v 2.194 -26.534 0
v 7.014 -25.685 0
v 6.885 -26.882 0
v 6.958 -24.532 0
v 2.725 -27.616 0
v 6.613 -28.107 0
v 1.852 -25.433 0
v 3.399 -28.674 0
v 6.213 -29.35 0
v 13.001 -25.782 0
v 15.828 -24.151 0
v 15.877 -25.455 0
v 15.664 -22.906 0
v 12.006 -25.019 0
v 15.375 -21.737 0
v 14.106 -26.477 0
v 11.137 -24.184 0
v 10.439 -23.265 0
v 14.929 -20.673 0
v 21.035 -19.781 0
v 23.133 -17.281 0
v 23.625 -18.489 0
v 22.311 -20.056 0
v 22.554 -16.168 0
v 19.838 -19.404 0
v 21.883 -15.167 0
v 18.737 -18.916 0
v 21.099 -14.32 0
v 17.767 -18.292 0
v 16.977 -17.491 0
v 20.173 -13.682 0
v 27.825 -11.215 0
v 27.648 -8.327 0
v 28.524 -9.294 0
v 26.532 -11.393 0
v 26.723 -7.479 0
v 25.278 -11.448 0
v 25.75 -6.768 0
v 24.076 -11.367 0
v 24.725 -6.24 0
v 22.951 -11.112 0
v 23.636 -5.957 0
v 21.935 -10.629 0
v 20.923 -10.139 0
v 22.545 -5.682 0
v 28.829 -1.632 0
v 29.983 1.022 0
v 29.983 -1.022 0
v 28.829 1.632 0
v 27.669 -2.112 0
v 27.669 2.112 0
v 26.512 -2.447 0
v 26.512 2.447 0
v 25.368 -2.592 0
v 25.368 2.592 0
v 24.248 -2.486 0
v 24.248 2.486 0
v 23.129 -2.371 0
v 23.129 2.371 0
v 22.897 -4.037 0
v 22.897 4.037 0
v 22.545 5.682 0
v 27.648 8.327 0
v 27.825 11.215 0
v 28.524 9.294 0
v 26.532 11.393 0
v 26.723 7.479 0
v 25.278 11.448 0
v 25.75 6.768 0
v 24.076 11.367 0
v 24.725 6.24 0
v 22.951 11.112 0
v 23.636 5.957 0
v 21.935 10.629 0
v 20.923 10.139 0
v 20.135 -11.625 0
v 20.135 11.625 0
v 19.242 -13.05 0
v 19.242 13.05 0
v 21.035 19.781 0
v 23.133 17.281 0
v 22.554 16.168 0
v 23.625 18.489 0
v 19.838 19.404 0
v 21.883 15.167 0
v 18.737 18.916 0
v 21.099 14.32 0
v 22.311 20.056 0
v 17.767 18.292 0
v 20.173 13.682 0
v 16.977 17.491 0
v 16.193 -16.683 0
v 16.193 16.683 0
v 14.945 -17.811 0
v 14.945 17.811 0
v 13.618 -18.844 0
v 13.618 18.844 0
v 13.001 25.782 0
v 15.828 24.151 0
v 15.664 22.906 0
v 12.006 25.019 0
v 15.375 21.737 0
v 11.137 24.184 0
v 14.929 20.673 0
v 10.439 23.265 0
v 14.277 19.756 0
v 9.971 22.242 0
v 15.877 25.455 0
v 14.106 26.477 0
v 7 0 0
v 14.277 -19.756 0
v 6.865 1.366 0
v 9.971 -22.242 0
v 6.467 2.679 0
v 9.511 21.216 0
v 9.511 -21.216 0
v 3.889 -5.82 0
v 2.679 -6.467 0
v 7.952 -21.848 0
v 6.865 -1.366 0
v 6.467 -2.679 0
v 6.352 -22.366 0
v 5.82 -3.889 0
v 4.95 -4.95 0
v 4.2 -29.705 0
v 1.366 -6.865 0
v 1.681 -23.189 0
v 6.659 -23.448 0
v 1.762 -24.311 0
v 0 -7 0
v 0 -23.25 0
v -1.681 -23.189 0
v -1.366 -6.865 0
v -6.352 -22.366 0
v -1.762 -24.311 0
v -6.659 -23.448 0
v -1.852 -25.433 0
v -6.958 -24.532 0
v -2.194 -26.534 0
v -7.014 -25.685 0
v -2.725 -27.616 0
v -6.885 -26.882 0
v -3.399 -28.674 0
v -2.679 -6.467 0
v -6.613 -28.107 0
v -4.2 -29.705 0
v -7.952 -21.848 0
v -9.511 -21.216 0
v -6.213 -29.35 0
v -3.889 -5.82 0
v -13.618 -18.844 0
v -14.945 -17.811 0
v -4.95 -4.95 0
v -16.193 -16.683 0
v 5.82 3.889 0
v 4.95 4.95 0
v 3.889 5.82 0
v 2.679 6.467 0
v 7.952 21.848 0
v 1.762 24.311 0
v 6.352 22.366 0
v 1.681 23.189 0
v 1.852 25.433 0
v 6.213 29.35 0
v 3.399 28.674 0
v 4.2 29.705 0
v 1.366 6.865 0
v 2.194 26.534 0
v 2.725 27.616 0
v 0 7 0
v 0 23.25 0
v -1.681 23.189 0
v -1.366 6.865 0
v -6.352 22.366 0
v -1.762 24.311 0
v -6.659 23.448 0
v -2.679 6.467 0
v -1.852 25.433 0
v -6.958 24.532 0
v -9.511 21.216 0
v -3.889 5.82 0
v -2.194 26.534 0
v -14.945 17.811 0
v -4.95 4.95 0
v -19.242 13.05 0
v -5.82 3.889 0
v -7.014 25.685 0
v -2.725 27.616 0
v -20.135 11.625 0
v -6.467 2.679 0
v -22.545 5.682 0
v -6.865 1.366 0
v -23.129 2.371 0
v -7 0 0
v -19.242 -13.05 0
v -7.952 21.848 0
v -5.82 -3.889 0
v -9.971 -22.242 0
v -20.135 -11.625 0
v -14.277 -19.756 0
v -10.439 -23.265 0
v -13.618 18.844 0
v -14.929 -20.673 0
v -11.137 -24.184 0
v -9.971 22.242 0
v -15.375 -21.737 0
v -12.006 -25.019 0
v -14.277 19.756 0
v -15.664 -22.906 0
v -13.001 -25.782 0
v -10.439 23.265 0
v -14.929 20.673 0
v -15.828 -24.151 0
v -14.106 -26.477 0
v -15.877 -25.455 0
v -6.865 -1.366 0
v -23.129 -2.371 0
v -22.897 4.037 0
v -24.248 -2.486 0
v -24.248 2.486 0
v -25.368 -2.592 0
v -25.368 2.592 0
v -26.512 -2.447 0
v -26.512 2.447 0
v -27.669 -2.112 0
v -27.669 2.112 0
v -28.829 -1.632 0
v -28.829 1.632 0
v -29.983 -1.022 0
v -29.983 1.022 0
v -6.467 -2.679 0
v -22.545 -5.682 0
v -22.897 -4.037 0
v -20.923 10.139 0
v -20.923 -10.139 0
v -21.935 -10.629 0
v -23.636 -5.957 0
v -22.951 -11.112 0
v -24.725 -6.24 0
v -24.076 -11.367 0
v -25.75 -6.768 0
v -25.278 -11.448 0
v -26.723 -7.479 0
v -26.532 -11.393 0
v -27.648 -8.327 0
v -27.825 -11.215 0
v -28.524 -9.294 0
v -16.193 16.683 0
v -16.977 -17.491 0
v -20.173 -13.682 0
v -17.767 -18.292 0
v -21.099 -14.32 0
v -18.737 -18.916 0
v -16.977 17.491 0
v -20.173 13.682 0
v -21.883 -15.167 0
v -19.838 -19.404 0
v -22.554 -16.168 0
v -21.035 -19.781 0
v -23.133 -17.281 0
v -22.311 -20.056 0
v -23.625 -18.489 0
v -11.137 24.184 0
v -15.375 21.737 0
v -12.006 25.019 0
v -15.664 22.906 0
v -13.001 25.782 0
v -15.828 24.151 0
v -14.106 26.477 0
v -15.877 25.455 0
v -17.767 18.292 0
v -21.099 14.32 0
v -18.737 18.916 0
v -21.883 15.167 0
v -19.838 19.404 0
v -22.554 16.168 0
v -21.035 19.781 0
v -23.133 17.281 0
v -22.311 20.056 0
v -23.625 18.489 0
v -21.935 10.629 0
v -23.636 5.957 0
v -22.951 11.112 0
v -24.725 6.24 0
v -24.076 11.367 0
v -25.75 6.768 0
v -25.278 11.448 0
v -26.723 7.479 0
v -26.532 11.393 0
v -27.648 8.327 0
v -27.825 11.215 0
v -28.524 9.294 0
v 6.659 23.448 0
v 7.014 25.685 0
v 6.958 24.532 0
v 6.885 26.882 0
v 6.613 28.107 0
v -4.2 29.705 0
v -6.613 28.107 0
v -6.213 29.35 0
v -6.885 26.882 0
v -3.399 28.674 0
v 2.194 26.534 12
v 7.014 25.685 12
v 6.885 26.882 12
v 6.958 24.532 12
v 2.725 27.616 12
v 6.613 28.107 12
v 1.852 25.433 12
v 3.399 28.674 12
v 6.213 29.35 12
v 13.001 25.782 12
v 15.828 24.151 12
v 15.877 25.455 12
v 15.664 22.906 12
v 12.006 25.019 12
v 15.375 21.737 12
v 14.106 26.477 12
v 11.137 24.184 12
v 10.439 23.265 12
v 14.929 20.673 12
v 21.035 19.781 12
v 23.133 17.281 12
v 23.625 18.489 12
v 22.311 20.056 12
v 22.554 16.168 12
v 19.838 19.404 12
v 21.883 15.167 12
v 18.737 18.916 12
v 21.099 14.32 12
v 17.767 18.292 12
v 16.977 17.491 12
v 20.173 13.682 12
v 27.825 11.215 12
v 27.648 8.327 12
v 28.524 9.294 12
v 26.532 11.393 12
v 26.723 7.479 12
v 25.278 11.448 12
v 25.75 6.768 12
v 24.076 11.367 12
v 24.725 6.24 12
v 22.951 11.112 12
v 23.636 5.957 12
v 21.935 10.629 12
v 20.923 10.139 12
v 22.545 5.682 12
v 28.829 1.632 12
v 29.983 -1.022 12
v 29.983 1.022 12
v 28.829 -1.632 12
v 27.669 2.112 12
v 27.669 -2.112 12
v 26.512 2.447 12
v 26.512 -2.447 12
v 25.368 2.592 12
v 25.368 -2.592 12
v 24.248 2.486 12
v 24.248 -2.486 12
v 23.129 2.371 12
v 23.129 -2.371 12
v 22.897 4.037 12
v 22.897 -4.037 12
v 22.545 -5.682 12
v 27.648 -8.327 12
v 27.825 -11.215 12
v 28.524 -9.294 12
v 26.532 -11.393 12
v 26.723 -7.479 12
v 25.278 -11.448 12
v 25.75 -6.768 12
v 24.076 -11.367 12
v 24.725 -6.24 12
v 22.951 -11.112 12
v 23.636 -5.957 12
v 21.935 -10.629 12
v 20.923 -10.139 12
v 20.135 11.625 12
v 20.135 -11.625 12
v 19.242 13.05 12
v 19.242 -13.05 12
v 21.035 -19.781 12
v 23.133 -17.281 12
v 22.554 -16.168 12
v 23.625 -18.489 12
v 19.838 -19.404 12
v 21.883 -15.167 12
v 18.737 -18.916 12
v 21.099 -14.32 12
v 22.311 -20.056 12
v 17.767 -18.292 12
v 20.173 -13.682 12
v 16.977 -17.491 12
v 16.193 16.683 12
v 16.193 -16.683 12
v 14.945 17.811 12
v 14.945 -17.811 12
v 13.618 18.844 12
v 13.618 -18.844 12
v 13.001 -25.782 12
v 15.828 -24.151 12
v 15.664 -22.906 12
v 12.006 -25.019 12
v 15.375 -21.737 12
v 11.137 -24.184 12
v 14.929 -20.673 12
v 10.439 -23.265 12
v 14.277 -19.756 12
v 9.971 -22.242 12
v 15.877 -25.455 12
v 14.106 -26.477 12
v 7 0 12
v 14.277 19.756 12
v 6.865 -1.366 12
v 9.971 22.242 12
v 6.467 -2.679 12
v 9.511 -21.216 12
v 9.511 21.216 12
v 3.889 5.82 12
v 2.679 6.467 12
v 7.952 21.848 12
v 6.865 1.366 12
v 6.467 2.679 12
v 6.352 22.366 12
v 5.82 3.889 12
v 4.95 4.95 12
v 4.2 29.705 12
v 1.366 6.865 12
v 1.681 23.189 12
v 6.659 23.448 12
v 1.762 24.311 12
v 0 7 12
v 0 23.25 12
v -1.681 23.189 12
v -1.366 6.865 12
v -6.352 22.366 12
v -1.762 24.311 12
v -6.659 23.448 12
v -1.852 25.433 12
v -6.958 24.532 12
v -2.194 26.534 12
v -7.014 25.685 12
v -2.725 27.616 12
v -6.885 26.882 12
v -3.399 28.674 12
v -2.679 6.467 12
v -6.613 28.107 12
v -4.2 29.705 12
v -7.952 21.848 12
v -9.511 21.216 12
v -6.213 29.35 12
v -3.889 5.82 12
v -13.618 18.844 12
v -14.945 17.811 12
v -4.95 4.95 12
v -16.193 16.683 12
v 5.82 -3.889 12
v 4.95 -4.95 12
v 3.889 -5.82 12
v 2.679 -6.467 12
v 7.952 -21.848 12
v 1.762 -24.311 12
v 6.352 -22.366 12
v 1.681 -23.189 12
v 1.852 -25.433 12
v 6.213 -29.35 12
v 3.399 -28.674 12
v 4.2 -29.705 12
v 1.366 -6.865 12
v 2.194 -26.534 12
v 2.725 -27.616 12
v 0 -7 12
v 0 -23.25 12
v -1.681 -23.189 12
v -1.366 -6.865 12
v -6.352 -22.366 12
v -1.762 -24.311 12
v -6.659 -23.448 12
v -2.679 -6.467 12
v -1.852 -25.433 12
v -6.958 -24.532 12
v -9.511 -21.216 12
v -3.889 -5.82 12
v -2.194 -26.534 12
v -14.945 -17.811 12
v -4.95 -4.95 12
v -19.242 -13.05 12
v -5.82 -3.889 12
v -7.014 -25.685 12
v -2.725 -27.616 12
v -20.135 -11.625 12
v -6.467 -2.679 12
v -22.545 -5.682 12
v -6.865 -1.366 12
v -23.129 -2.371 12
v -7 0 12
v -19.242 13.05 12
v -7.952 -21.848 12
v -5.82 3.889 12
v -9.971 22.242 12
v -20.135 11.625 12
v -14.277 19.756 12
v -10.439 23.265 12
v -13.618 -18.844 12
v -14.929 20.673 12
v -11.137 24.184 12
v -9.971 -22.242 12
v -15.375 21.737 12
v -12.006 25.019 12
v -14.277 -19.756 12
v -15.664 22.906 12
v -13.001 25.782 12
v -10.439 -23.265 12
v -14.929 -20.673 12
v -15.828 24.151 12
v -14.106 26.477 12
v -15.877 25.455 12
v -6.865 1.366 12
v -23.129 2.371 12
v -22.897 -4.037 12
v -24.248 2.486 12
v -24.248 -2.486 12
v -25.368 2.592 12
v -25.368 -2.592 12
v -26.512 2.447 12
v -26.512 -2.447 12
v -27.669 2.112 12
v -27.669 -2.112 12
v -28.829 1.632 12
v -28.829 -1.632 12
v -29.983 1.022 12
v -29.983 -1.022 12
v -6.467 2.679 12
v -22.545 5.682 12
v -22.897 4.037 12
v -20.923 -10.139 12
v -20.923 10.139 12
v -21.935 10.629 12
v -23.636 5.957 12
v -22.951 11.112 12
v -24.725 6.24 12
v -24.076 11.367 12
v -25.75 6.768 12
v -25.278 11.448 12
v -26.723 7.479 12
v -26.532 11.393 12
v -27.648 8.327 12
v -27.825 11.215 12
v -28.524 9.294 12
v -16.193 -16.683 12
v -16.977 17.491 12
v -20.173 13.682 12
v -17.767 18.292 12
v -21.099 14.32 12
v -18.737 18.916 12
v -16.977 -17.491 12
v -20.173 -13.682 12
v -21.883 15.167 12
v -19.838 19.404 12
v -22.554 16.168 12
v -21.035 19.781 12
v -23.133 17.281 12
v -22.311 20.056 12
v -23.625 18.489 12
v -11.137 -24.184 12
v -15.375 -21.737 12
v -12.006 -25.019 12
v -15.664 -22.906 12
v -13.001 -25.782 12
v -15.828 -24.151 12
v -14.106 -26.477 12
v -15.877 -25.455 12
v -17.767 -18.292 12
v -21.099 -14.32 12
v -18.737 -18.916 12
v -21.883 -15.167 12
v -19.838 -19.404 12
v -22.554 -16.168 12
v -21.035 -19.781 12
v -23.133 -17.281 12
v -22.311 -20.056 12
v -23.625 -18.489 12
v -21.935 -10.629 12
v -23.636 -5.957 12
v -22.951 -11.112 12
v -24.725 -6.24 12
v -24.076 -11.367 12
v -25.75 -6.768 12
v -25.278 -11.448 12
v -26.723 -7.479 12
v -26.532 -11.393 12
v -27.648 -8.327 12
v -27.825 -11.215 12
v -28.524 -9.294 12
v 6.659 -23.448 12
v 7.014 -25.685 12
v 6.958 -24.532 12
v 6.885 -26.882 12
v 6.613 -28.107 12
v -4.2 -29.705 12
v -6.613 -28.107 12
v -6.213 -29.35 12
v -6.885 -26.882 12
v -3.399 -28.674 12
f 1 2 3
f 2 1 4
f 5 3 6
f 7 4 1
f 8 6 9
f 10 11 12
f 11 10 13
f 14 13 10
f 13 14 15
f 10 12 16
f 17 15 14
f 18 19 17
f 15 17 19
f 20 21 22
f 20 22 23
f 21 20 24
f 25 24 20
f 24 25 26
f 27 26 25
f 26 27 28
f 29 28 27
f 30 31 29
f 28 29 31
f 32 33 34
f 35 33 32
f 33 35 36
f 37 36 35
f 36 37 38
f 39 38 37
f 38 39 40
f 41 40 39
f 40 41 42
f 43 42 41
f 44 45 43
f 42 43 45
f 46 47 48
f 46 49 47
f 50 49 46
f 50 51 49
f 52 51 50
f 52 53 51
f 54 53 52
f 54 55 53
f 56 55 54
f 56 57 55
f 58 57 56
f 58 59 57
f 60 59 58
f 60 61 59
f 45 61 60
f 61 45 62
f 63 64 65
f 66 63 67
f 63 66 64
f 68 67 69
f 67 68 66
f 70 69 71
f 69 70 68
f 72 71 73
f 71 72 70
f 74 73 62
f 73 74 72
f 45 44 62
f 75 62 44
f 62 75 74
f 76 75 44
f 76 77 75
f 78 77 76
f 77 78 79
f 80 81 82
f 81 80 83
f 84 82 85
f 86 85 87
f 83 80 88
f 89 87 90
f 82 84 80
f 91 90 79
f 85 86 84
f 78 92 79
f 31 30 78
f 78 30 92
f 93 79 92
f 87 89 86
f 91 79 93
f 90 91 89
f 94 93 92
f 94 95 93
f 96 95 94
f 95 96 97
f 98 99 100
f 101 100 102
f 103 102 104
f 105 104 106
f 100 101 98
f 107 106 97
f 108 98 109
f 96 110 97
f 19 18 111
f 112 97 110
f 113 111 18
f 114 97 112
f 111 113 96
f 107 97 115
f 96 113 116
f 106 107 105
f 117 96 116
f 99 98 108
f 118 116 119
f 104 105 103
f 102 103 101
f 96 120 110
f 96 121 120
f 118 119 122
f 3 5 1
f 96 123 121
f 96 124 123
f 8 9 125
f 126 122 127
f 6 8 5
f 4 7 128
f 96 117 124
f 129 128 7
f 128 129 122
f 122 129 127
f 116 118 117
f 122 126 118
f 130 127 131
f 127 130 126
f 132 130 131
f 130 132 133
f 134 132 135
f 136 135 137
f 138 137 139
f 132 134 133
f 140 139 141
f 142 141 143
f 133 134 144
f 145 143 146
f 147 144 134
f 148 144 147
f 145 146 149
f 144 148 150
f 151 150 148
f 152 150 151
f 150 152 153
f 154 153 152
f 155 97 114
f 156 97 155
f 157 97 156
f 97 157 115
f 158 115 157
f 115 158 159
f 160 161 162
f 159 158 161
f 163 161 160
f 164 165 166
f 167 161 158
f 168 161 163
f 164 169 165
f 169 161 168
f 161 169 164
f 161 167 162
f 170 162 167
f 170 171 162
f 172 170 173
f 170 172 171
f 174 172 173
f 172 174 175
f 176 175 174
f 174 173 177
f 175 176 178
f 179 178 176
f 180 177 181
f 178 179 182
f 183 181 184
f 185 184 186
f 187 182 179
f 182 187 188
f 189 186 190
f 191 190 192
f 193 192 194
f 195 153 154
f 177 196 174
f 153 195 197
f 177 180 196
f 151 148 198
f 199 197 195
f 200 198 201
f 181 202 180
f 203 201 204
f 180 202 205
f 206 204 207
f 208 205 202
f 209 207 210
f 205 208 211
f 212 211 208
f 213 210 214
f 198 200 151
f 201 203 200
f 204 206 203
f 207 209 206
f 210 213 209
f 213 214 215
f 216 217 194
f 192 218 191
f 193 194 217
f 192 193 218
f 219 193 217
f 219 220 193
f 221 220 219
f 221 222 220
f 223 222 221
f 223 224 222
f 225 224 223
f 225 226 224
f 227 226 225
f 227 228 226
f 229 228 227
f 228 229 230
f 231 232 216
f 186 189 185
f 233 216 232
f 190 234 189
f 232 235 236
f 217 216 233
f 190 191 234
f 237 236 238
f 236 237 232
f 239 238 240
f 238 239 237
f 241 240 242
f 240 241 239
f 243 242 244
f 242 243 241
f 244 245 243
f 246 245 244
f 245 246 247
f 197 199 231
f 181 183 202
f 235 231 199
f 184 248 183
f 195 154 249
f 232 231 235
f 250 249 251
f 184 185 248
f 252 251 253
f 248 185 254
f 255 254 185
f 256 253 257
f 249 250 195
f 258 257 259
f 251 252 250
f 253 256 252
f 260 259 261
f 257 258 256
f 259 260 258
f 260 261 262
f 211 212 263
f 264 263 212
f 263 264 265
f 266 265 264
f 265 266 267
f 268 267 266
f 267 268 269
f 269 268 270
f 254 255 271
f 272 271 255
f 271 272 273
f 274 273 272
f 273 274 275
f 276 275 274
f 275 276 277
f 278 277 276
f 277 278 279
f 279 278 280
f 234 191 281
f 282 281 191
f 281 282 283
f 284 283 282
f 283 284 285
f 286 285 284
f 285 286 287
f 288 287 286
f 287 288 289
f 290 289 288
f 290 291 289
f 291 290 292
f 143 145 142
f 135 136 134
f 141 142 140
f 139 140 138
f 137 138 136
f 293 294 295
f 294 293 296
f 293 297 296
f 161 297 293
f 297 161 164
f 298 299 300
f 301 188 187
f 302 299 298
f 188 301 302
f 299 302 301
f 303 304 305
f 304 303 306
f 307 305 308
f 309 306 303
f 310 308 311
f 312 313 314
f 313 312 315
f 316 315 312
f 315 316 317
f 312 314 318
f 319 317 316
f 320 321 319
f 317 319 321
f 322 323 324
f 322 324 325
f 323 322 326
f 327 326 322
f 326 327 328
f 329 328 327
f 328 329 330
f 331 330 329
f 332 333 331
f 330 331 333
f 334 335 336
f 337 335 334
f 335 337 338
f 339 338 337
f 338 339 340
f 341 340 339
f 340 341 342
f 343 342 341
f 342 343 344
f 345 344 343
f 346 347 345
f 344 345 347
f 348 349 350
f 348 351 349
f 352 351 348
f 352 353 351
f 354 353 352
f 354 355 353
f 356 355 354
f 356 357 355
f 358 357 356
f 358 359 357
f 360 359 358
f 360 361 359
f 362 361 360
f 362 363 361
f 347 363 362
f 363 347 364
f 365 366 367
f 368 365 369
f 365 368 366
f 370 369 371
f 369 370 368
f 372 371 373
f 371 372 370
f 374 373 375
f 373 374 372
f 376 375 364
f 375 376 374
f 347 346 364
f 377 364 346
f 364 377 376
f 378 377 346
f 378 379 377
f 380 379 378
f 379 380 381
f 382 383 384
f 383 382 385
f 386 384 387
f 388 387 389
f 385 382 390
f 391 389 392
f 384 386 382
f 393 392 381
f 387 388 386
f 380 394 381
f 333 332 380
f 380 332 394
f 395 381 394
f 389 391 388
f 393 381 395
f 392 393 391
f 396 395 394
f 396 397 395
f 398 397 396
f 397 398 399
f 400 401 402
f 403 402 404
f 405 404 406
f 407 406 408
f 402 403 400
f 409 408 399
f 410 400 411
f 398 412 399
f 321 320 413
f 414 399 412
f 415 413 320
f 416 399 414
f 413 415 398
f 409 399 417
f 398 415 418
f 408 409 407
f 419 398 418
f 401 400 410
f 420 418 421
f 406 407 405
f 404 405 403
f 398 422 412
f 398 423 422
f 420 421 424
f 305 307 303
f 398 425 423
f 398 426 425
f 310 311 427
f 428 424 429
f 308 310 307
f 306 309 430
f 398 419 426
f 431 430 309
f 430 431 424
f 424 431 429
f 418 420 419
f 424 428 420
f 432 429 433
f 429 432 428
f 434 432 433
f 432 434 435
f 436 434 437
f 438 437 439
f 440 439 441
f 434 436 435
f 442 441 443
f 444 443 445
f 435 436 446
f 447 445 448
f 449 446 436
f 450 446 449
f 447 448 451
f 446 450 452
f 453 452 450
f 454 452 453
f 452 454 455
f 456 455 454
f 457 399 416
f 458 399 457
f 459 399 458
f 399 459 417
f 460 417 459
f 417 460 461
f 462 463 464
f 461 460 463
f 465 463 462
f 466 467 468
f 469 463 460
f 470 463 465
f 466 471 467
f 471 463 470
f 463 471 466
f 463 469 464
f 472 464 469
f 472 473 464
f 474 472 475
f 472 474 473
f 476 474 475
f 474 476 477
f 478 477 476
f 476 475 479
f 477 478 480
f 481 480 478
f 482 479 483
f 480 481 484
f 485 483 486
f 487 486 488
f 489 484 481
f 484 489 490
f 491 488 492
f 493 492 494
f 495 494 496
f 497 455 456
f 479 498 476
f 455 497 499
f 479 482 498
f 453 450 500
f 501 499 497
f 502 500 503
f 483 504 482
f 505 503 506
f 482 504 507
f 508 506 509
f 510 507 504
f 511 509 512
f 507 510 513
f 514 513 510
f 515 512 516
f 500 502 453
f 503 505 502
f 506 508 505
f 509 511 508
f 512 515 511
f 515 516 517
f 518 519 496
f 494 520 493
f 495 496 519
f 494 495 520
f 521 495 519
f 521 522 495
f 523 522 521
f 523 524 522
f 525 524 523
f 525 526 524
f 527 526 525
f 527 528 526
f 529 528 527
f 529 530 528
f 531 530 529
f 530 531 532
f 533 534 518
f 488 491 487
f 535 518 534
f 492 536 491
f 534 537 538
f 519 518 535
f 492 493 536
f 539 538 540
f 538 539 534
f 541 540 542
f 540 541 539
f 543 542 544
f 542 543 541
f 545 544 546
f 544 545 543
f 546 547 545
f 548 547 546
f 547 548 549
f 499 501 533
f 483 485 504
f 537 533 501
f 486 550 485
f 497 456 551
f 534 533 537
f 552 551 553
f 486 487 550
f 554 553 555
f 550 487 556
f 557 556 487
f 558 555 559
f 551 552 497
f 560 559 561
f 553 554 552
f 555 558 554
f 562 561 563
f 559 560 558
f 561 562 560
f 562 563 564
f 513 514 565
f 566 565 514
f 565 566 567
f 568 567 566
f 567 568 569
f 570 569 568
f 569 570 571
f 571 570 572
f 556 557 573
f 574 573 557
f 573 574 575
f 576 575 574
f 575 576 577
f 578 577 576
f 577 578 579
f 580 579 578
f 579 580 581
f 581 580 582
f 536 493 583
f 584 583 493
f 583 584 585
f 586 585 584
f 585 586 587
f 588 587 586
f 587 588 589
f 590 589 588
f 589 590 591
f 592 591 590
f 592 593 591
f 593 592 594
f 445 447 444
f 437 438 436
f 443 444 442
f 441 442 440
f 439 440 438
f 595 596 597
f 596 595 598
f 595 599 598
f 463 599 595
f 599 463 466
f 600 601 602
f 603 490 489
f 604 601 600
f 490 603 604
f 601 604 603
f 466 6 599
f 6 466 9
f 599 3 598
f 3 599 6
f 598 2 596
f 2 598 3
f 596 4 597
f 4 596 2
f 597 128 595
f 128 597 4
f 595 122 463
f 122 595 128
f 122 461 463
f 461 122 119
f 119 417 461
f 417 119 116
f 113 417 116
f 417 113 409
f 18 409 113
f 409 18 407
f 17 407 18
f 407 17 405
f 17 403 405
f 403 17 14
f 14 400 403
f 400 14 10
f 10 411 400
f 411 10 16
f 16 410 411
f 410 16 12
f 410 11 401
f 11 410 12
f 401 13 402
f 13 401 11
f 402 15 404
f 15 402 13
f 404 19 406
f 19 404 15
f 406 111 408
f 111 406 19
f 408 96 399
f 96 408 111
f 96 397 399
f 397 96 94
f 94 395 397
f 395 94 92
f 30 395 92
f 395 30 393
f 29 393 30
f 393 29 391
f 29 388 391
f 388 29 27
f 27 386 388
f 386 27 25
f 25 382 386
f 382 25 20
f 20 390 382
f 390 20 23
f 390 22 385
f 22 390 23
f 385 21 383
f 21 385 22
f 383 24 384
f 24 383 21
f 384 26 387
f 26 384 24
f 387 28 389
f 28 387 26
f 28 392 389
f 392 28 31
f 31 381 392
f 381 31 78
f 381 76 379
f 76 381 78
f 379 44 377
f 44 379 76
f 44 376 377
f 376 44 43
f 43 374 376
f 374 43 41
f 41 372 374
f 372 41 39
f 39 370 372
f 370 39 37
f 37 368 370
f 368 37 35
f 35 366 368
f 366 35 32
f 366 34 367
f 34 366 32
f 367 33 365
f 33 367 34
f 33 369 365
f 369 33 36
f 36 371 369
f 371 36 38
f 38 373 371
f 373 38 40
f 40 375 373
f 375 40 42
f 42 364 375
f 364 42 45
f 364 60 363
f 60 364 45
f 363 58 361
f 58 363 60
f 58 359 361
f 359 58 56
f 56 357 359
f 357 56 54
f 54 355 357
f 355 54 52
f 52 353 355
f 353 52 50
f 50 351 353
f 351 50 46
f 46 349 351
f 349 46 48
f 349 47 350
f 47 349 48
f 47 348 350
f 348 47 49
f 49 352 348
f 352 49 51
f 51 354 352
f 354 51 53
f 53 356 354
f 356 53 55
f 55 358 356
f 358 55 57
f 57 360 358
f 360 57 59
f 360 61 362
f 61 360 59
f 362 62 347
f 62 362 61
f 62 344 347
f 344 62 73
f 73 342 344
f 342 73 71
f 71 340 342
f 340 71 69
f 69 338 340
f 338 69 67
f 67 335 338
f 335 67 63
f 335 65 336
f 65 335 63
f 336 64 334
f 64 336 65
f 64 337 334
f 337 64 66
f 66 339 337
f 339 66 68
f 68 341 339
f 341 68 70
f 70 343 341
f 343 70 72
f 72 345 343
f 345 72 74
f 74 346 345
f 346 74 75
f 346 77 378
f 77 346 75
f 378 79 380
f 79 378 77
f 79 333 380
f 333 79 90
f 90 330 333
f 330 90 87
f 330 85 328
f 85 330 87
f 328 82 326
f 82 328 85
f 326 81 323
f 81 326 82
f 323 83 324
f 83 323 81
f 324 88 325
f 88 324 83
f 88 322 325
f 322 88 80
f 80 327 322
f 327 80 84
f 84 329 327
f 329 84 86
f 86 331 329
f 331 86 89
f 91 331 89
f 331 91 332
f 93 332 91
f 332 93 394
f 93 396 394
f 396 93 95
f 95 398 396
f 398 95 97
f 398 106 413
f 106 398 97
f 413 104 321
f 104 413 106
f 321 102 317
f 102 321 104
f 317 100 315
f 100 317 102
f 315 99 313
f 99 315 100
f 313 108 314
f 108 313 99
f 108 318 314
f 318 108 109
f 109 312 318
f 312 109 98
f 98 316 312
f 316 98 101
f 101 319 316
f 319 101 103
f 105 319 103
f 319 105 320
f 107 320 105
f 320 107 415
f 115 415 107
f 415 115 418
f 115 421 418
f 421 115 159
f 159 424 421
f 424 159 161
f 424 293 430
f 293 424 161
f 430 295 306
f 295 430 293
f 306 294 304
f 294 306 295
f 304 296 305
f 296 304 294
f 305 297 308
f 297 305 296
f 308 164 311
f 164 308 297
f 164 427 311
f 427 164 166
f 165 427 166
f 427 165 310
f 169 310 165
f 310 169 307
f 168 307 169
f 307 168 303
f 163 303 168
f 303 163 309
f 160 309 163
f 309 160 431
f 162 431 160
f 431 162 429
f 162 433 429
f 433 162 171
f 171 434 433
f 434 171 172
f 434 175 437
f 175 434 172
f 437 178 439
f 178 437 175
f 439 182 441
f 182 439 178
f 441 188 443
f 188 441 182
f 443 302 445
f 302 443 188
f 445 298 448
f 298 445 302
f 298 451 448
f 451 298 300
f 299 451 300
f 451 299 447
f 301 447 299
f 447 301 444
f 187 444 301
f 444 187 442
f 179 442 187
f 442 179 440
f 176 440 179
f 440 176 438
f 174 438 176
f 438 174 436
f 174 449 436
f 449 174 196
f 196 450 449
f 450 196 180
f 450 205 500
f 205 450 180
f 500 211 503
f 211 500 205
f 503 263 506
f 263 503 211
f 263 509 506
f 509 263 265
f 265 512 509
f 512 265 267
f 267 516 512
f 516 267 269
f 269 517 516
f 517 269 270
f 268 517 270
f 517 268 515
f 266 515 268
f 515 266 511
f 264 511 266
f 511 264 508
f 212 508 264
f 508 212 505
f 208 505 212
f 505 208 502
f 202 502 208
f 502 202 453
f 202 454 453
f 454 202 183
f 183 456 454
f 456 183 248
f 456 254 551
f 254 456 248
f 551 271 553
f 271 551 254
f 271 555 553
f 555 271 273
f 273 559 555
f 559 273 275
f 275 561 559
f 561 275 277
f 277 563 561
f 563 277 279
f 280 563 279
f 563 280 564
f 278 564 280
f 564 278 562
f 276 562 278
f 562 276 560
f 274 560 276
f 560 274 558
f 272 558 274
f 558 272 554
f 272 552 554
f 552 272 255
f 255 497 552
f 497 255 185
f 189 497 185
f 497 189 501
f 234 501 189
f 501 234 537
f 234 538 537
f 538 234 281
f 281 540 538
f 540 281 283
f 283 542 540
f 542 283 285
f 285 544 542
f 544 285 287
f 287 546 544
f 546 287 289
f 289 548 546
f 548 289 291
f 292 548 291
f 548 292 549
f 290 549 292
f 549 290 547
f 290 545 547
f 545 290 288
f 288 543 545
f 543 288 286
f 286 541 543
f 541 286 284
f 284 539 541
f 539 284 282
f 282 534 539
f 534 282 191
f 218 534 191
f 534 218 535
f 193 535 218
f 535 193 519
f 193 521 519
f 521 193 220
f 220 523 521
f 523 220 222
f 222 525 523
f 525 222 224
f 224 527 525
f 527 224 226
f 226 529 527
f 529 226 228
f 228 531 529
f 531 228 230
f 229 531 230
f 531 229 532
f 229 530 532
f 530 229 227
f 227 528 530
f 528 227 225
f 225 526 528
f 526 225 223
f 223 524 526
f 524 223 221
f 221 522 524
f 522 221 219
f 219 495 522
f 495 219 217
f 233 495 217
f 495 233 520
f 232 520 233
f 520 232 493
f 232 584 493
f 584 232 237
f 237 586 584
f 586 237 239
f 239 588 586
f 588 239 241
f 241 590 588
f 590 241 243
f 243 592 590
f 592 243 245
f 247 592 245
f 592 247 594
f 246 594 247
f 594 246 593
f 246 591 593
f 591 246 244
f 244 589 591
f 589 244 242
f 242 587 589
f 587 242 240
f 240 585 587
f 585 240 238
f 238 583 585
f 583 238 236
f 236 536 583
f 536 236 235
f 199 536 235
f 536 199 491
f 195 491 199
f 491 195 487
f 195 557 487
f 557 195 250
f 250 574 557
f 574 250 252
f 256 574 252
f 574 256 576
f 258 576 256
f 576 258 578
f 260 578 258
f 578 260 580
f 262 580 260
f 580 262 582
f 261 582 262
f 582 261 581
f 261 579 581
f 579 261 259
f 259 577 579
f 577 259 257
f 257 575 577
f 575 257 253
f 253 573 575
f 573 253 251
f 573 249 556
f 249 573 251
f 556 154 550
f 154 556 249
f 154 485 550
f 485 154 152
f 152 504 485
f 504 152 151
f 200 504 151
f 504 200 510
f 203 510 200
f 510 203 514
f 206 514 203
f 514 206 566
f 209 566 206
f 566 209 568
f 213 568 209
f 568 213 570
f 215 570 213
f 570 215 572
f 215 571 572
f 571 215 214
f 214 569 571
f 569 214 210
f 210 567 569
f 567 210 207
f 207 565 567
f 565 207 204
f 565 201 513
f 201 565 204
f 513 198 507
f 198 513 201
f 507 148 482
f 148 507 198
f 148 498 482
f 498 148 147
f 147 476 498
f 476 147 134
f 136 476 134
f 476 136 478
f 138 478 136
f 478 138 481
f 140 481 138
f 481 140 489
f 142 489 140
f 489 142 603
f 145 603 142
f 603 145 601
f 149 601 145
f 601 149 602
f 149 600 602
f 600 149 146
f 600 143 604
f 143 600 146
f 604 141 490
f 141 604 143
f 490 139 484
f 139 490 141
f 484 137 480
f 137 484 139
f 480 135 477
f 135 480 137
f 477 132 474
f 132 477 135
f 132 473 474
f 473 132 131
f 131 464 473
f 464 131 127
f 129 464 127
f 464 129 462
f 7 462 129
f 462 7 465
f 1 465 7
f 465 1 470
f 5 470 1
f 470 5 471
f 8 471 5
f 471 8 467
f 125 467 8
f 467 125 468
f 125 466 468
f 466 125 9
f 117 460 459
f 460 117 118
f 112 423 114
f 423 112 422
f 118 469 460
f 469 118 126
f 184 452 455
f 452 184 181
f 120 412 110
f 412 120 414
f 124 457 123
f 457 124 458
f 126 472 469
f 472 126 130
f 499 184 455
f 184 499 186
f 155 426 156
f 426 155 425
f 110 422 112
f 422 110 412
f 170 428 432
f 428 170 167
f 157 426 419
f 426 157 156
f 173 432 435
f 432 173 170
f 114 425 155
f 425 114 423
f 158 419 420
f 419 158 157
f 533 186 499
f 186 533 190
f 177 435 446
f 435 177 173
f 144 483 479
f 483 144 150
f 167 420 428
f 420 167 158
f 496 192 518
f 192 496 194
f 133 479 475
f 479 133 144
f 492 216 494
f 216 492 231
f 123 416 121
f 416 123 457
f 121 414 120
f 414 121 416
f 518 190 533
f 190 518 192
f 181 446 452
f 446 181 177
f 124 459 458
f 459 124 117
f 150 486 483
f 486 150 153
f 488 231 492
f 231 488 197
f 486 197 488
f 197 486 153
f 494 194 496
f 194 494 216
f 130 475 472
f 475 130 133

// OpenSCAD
$fn = 32;

// ----------------------------------------------------------------------
// Spur gear: m=3 z=18, 60 mm tip diameter x 12 mm
// ----------------------------------------------------------------------

// --- parameters (mm) ---
modul = 3;                // module
n_teeth = 18;             // number of teeth
width = 12;               // face width
pa = 20;                  // pressure angle, deg
shaft_d = 14;             // shaft bore

/* --- involute profile --- */
pitch_r = modul * n_teeth / 2;
base_r = pitch_r * cos(pa);
tip_r = pitch_r + modul;
root_r = pitch_r - 1.25 * modul;
flank_steps = 6;

function inv_deg(a) = (tan(a) - a * PI / 180) * 180 / PI;
function flank_r(i) = root_r + (tip_r - root_r) * i / flank_steps;
function half_angle(r) = 90 / n_teeth + inv_deg(pa) - inv_deg(acos(min(1, base_r / r)));
function tooth_pt(k, i, side) =
    let (r = flank_r(i), a = k * 360 / n_teeth + side * half_angle(r))
    [r * cos(a), r * sin(a)];

module tooth_profile() {
  polygon(points = [
    for (k = [0 : n_teeth - 1])
      each [
        for (i = [0 : flank_steps]) tooth_pt(k, i, -1),
        for (i = [flank_steps : -1 : 0]) tooth_pt(k, i, 1),
        let (ta = (k + 0.5) * 360 / n_teeth)
          [root_r * cos(ta), root_r * sin(ta)]
      ]
  ]);
}

module gear_disc() {
  linear_extrude(height = width) tooth_profile();
}

difference() {
  gear_disc();
  translate([0, 0, -1]) cylinder(h = width + 3, d = shaft_d);
}
